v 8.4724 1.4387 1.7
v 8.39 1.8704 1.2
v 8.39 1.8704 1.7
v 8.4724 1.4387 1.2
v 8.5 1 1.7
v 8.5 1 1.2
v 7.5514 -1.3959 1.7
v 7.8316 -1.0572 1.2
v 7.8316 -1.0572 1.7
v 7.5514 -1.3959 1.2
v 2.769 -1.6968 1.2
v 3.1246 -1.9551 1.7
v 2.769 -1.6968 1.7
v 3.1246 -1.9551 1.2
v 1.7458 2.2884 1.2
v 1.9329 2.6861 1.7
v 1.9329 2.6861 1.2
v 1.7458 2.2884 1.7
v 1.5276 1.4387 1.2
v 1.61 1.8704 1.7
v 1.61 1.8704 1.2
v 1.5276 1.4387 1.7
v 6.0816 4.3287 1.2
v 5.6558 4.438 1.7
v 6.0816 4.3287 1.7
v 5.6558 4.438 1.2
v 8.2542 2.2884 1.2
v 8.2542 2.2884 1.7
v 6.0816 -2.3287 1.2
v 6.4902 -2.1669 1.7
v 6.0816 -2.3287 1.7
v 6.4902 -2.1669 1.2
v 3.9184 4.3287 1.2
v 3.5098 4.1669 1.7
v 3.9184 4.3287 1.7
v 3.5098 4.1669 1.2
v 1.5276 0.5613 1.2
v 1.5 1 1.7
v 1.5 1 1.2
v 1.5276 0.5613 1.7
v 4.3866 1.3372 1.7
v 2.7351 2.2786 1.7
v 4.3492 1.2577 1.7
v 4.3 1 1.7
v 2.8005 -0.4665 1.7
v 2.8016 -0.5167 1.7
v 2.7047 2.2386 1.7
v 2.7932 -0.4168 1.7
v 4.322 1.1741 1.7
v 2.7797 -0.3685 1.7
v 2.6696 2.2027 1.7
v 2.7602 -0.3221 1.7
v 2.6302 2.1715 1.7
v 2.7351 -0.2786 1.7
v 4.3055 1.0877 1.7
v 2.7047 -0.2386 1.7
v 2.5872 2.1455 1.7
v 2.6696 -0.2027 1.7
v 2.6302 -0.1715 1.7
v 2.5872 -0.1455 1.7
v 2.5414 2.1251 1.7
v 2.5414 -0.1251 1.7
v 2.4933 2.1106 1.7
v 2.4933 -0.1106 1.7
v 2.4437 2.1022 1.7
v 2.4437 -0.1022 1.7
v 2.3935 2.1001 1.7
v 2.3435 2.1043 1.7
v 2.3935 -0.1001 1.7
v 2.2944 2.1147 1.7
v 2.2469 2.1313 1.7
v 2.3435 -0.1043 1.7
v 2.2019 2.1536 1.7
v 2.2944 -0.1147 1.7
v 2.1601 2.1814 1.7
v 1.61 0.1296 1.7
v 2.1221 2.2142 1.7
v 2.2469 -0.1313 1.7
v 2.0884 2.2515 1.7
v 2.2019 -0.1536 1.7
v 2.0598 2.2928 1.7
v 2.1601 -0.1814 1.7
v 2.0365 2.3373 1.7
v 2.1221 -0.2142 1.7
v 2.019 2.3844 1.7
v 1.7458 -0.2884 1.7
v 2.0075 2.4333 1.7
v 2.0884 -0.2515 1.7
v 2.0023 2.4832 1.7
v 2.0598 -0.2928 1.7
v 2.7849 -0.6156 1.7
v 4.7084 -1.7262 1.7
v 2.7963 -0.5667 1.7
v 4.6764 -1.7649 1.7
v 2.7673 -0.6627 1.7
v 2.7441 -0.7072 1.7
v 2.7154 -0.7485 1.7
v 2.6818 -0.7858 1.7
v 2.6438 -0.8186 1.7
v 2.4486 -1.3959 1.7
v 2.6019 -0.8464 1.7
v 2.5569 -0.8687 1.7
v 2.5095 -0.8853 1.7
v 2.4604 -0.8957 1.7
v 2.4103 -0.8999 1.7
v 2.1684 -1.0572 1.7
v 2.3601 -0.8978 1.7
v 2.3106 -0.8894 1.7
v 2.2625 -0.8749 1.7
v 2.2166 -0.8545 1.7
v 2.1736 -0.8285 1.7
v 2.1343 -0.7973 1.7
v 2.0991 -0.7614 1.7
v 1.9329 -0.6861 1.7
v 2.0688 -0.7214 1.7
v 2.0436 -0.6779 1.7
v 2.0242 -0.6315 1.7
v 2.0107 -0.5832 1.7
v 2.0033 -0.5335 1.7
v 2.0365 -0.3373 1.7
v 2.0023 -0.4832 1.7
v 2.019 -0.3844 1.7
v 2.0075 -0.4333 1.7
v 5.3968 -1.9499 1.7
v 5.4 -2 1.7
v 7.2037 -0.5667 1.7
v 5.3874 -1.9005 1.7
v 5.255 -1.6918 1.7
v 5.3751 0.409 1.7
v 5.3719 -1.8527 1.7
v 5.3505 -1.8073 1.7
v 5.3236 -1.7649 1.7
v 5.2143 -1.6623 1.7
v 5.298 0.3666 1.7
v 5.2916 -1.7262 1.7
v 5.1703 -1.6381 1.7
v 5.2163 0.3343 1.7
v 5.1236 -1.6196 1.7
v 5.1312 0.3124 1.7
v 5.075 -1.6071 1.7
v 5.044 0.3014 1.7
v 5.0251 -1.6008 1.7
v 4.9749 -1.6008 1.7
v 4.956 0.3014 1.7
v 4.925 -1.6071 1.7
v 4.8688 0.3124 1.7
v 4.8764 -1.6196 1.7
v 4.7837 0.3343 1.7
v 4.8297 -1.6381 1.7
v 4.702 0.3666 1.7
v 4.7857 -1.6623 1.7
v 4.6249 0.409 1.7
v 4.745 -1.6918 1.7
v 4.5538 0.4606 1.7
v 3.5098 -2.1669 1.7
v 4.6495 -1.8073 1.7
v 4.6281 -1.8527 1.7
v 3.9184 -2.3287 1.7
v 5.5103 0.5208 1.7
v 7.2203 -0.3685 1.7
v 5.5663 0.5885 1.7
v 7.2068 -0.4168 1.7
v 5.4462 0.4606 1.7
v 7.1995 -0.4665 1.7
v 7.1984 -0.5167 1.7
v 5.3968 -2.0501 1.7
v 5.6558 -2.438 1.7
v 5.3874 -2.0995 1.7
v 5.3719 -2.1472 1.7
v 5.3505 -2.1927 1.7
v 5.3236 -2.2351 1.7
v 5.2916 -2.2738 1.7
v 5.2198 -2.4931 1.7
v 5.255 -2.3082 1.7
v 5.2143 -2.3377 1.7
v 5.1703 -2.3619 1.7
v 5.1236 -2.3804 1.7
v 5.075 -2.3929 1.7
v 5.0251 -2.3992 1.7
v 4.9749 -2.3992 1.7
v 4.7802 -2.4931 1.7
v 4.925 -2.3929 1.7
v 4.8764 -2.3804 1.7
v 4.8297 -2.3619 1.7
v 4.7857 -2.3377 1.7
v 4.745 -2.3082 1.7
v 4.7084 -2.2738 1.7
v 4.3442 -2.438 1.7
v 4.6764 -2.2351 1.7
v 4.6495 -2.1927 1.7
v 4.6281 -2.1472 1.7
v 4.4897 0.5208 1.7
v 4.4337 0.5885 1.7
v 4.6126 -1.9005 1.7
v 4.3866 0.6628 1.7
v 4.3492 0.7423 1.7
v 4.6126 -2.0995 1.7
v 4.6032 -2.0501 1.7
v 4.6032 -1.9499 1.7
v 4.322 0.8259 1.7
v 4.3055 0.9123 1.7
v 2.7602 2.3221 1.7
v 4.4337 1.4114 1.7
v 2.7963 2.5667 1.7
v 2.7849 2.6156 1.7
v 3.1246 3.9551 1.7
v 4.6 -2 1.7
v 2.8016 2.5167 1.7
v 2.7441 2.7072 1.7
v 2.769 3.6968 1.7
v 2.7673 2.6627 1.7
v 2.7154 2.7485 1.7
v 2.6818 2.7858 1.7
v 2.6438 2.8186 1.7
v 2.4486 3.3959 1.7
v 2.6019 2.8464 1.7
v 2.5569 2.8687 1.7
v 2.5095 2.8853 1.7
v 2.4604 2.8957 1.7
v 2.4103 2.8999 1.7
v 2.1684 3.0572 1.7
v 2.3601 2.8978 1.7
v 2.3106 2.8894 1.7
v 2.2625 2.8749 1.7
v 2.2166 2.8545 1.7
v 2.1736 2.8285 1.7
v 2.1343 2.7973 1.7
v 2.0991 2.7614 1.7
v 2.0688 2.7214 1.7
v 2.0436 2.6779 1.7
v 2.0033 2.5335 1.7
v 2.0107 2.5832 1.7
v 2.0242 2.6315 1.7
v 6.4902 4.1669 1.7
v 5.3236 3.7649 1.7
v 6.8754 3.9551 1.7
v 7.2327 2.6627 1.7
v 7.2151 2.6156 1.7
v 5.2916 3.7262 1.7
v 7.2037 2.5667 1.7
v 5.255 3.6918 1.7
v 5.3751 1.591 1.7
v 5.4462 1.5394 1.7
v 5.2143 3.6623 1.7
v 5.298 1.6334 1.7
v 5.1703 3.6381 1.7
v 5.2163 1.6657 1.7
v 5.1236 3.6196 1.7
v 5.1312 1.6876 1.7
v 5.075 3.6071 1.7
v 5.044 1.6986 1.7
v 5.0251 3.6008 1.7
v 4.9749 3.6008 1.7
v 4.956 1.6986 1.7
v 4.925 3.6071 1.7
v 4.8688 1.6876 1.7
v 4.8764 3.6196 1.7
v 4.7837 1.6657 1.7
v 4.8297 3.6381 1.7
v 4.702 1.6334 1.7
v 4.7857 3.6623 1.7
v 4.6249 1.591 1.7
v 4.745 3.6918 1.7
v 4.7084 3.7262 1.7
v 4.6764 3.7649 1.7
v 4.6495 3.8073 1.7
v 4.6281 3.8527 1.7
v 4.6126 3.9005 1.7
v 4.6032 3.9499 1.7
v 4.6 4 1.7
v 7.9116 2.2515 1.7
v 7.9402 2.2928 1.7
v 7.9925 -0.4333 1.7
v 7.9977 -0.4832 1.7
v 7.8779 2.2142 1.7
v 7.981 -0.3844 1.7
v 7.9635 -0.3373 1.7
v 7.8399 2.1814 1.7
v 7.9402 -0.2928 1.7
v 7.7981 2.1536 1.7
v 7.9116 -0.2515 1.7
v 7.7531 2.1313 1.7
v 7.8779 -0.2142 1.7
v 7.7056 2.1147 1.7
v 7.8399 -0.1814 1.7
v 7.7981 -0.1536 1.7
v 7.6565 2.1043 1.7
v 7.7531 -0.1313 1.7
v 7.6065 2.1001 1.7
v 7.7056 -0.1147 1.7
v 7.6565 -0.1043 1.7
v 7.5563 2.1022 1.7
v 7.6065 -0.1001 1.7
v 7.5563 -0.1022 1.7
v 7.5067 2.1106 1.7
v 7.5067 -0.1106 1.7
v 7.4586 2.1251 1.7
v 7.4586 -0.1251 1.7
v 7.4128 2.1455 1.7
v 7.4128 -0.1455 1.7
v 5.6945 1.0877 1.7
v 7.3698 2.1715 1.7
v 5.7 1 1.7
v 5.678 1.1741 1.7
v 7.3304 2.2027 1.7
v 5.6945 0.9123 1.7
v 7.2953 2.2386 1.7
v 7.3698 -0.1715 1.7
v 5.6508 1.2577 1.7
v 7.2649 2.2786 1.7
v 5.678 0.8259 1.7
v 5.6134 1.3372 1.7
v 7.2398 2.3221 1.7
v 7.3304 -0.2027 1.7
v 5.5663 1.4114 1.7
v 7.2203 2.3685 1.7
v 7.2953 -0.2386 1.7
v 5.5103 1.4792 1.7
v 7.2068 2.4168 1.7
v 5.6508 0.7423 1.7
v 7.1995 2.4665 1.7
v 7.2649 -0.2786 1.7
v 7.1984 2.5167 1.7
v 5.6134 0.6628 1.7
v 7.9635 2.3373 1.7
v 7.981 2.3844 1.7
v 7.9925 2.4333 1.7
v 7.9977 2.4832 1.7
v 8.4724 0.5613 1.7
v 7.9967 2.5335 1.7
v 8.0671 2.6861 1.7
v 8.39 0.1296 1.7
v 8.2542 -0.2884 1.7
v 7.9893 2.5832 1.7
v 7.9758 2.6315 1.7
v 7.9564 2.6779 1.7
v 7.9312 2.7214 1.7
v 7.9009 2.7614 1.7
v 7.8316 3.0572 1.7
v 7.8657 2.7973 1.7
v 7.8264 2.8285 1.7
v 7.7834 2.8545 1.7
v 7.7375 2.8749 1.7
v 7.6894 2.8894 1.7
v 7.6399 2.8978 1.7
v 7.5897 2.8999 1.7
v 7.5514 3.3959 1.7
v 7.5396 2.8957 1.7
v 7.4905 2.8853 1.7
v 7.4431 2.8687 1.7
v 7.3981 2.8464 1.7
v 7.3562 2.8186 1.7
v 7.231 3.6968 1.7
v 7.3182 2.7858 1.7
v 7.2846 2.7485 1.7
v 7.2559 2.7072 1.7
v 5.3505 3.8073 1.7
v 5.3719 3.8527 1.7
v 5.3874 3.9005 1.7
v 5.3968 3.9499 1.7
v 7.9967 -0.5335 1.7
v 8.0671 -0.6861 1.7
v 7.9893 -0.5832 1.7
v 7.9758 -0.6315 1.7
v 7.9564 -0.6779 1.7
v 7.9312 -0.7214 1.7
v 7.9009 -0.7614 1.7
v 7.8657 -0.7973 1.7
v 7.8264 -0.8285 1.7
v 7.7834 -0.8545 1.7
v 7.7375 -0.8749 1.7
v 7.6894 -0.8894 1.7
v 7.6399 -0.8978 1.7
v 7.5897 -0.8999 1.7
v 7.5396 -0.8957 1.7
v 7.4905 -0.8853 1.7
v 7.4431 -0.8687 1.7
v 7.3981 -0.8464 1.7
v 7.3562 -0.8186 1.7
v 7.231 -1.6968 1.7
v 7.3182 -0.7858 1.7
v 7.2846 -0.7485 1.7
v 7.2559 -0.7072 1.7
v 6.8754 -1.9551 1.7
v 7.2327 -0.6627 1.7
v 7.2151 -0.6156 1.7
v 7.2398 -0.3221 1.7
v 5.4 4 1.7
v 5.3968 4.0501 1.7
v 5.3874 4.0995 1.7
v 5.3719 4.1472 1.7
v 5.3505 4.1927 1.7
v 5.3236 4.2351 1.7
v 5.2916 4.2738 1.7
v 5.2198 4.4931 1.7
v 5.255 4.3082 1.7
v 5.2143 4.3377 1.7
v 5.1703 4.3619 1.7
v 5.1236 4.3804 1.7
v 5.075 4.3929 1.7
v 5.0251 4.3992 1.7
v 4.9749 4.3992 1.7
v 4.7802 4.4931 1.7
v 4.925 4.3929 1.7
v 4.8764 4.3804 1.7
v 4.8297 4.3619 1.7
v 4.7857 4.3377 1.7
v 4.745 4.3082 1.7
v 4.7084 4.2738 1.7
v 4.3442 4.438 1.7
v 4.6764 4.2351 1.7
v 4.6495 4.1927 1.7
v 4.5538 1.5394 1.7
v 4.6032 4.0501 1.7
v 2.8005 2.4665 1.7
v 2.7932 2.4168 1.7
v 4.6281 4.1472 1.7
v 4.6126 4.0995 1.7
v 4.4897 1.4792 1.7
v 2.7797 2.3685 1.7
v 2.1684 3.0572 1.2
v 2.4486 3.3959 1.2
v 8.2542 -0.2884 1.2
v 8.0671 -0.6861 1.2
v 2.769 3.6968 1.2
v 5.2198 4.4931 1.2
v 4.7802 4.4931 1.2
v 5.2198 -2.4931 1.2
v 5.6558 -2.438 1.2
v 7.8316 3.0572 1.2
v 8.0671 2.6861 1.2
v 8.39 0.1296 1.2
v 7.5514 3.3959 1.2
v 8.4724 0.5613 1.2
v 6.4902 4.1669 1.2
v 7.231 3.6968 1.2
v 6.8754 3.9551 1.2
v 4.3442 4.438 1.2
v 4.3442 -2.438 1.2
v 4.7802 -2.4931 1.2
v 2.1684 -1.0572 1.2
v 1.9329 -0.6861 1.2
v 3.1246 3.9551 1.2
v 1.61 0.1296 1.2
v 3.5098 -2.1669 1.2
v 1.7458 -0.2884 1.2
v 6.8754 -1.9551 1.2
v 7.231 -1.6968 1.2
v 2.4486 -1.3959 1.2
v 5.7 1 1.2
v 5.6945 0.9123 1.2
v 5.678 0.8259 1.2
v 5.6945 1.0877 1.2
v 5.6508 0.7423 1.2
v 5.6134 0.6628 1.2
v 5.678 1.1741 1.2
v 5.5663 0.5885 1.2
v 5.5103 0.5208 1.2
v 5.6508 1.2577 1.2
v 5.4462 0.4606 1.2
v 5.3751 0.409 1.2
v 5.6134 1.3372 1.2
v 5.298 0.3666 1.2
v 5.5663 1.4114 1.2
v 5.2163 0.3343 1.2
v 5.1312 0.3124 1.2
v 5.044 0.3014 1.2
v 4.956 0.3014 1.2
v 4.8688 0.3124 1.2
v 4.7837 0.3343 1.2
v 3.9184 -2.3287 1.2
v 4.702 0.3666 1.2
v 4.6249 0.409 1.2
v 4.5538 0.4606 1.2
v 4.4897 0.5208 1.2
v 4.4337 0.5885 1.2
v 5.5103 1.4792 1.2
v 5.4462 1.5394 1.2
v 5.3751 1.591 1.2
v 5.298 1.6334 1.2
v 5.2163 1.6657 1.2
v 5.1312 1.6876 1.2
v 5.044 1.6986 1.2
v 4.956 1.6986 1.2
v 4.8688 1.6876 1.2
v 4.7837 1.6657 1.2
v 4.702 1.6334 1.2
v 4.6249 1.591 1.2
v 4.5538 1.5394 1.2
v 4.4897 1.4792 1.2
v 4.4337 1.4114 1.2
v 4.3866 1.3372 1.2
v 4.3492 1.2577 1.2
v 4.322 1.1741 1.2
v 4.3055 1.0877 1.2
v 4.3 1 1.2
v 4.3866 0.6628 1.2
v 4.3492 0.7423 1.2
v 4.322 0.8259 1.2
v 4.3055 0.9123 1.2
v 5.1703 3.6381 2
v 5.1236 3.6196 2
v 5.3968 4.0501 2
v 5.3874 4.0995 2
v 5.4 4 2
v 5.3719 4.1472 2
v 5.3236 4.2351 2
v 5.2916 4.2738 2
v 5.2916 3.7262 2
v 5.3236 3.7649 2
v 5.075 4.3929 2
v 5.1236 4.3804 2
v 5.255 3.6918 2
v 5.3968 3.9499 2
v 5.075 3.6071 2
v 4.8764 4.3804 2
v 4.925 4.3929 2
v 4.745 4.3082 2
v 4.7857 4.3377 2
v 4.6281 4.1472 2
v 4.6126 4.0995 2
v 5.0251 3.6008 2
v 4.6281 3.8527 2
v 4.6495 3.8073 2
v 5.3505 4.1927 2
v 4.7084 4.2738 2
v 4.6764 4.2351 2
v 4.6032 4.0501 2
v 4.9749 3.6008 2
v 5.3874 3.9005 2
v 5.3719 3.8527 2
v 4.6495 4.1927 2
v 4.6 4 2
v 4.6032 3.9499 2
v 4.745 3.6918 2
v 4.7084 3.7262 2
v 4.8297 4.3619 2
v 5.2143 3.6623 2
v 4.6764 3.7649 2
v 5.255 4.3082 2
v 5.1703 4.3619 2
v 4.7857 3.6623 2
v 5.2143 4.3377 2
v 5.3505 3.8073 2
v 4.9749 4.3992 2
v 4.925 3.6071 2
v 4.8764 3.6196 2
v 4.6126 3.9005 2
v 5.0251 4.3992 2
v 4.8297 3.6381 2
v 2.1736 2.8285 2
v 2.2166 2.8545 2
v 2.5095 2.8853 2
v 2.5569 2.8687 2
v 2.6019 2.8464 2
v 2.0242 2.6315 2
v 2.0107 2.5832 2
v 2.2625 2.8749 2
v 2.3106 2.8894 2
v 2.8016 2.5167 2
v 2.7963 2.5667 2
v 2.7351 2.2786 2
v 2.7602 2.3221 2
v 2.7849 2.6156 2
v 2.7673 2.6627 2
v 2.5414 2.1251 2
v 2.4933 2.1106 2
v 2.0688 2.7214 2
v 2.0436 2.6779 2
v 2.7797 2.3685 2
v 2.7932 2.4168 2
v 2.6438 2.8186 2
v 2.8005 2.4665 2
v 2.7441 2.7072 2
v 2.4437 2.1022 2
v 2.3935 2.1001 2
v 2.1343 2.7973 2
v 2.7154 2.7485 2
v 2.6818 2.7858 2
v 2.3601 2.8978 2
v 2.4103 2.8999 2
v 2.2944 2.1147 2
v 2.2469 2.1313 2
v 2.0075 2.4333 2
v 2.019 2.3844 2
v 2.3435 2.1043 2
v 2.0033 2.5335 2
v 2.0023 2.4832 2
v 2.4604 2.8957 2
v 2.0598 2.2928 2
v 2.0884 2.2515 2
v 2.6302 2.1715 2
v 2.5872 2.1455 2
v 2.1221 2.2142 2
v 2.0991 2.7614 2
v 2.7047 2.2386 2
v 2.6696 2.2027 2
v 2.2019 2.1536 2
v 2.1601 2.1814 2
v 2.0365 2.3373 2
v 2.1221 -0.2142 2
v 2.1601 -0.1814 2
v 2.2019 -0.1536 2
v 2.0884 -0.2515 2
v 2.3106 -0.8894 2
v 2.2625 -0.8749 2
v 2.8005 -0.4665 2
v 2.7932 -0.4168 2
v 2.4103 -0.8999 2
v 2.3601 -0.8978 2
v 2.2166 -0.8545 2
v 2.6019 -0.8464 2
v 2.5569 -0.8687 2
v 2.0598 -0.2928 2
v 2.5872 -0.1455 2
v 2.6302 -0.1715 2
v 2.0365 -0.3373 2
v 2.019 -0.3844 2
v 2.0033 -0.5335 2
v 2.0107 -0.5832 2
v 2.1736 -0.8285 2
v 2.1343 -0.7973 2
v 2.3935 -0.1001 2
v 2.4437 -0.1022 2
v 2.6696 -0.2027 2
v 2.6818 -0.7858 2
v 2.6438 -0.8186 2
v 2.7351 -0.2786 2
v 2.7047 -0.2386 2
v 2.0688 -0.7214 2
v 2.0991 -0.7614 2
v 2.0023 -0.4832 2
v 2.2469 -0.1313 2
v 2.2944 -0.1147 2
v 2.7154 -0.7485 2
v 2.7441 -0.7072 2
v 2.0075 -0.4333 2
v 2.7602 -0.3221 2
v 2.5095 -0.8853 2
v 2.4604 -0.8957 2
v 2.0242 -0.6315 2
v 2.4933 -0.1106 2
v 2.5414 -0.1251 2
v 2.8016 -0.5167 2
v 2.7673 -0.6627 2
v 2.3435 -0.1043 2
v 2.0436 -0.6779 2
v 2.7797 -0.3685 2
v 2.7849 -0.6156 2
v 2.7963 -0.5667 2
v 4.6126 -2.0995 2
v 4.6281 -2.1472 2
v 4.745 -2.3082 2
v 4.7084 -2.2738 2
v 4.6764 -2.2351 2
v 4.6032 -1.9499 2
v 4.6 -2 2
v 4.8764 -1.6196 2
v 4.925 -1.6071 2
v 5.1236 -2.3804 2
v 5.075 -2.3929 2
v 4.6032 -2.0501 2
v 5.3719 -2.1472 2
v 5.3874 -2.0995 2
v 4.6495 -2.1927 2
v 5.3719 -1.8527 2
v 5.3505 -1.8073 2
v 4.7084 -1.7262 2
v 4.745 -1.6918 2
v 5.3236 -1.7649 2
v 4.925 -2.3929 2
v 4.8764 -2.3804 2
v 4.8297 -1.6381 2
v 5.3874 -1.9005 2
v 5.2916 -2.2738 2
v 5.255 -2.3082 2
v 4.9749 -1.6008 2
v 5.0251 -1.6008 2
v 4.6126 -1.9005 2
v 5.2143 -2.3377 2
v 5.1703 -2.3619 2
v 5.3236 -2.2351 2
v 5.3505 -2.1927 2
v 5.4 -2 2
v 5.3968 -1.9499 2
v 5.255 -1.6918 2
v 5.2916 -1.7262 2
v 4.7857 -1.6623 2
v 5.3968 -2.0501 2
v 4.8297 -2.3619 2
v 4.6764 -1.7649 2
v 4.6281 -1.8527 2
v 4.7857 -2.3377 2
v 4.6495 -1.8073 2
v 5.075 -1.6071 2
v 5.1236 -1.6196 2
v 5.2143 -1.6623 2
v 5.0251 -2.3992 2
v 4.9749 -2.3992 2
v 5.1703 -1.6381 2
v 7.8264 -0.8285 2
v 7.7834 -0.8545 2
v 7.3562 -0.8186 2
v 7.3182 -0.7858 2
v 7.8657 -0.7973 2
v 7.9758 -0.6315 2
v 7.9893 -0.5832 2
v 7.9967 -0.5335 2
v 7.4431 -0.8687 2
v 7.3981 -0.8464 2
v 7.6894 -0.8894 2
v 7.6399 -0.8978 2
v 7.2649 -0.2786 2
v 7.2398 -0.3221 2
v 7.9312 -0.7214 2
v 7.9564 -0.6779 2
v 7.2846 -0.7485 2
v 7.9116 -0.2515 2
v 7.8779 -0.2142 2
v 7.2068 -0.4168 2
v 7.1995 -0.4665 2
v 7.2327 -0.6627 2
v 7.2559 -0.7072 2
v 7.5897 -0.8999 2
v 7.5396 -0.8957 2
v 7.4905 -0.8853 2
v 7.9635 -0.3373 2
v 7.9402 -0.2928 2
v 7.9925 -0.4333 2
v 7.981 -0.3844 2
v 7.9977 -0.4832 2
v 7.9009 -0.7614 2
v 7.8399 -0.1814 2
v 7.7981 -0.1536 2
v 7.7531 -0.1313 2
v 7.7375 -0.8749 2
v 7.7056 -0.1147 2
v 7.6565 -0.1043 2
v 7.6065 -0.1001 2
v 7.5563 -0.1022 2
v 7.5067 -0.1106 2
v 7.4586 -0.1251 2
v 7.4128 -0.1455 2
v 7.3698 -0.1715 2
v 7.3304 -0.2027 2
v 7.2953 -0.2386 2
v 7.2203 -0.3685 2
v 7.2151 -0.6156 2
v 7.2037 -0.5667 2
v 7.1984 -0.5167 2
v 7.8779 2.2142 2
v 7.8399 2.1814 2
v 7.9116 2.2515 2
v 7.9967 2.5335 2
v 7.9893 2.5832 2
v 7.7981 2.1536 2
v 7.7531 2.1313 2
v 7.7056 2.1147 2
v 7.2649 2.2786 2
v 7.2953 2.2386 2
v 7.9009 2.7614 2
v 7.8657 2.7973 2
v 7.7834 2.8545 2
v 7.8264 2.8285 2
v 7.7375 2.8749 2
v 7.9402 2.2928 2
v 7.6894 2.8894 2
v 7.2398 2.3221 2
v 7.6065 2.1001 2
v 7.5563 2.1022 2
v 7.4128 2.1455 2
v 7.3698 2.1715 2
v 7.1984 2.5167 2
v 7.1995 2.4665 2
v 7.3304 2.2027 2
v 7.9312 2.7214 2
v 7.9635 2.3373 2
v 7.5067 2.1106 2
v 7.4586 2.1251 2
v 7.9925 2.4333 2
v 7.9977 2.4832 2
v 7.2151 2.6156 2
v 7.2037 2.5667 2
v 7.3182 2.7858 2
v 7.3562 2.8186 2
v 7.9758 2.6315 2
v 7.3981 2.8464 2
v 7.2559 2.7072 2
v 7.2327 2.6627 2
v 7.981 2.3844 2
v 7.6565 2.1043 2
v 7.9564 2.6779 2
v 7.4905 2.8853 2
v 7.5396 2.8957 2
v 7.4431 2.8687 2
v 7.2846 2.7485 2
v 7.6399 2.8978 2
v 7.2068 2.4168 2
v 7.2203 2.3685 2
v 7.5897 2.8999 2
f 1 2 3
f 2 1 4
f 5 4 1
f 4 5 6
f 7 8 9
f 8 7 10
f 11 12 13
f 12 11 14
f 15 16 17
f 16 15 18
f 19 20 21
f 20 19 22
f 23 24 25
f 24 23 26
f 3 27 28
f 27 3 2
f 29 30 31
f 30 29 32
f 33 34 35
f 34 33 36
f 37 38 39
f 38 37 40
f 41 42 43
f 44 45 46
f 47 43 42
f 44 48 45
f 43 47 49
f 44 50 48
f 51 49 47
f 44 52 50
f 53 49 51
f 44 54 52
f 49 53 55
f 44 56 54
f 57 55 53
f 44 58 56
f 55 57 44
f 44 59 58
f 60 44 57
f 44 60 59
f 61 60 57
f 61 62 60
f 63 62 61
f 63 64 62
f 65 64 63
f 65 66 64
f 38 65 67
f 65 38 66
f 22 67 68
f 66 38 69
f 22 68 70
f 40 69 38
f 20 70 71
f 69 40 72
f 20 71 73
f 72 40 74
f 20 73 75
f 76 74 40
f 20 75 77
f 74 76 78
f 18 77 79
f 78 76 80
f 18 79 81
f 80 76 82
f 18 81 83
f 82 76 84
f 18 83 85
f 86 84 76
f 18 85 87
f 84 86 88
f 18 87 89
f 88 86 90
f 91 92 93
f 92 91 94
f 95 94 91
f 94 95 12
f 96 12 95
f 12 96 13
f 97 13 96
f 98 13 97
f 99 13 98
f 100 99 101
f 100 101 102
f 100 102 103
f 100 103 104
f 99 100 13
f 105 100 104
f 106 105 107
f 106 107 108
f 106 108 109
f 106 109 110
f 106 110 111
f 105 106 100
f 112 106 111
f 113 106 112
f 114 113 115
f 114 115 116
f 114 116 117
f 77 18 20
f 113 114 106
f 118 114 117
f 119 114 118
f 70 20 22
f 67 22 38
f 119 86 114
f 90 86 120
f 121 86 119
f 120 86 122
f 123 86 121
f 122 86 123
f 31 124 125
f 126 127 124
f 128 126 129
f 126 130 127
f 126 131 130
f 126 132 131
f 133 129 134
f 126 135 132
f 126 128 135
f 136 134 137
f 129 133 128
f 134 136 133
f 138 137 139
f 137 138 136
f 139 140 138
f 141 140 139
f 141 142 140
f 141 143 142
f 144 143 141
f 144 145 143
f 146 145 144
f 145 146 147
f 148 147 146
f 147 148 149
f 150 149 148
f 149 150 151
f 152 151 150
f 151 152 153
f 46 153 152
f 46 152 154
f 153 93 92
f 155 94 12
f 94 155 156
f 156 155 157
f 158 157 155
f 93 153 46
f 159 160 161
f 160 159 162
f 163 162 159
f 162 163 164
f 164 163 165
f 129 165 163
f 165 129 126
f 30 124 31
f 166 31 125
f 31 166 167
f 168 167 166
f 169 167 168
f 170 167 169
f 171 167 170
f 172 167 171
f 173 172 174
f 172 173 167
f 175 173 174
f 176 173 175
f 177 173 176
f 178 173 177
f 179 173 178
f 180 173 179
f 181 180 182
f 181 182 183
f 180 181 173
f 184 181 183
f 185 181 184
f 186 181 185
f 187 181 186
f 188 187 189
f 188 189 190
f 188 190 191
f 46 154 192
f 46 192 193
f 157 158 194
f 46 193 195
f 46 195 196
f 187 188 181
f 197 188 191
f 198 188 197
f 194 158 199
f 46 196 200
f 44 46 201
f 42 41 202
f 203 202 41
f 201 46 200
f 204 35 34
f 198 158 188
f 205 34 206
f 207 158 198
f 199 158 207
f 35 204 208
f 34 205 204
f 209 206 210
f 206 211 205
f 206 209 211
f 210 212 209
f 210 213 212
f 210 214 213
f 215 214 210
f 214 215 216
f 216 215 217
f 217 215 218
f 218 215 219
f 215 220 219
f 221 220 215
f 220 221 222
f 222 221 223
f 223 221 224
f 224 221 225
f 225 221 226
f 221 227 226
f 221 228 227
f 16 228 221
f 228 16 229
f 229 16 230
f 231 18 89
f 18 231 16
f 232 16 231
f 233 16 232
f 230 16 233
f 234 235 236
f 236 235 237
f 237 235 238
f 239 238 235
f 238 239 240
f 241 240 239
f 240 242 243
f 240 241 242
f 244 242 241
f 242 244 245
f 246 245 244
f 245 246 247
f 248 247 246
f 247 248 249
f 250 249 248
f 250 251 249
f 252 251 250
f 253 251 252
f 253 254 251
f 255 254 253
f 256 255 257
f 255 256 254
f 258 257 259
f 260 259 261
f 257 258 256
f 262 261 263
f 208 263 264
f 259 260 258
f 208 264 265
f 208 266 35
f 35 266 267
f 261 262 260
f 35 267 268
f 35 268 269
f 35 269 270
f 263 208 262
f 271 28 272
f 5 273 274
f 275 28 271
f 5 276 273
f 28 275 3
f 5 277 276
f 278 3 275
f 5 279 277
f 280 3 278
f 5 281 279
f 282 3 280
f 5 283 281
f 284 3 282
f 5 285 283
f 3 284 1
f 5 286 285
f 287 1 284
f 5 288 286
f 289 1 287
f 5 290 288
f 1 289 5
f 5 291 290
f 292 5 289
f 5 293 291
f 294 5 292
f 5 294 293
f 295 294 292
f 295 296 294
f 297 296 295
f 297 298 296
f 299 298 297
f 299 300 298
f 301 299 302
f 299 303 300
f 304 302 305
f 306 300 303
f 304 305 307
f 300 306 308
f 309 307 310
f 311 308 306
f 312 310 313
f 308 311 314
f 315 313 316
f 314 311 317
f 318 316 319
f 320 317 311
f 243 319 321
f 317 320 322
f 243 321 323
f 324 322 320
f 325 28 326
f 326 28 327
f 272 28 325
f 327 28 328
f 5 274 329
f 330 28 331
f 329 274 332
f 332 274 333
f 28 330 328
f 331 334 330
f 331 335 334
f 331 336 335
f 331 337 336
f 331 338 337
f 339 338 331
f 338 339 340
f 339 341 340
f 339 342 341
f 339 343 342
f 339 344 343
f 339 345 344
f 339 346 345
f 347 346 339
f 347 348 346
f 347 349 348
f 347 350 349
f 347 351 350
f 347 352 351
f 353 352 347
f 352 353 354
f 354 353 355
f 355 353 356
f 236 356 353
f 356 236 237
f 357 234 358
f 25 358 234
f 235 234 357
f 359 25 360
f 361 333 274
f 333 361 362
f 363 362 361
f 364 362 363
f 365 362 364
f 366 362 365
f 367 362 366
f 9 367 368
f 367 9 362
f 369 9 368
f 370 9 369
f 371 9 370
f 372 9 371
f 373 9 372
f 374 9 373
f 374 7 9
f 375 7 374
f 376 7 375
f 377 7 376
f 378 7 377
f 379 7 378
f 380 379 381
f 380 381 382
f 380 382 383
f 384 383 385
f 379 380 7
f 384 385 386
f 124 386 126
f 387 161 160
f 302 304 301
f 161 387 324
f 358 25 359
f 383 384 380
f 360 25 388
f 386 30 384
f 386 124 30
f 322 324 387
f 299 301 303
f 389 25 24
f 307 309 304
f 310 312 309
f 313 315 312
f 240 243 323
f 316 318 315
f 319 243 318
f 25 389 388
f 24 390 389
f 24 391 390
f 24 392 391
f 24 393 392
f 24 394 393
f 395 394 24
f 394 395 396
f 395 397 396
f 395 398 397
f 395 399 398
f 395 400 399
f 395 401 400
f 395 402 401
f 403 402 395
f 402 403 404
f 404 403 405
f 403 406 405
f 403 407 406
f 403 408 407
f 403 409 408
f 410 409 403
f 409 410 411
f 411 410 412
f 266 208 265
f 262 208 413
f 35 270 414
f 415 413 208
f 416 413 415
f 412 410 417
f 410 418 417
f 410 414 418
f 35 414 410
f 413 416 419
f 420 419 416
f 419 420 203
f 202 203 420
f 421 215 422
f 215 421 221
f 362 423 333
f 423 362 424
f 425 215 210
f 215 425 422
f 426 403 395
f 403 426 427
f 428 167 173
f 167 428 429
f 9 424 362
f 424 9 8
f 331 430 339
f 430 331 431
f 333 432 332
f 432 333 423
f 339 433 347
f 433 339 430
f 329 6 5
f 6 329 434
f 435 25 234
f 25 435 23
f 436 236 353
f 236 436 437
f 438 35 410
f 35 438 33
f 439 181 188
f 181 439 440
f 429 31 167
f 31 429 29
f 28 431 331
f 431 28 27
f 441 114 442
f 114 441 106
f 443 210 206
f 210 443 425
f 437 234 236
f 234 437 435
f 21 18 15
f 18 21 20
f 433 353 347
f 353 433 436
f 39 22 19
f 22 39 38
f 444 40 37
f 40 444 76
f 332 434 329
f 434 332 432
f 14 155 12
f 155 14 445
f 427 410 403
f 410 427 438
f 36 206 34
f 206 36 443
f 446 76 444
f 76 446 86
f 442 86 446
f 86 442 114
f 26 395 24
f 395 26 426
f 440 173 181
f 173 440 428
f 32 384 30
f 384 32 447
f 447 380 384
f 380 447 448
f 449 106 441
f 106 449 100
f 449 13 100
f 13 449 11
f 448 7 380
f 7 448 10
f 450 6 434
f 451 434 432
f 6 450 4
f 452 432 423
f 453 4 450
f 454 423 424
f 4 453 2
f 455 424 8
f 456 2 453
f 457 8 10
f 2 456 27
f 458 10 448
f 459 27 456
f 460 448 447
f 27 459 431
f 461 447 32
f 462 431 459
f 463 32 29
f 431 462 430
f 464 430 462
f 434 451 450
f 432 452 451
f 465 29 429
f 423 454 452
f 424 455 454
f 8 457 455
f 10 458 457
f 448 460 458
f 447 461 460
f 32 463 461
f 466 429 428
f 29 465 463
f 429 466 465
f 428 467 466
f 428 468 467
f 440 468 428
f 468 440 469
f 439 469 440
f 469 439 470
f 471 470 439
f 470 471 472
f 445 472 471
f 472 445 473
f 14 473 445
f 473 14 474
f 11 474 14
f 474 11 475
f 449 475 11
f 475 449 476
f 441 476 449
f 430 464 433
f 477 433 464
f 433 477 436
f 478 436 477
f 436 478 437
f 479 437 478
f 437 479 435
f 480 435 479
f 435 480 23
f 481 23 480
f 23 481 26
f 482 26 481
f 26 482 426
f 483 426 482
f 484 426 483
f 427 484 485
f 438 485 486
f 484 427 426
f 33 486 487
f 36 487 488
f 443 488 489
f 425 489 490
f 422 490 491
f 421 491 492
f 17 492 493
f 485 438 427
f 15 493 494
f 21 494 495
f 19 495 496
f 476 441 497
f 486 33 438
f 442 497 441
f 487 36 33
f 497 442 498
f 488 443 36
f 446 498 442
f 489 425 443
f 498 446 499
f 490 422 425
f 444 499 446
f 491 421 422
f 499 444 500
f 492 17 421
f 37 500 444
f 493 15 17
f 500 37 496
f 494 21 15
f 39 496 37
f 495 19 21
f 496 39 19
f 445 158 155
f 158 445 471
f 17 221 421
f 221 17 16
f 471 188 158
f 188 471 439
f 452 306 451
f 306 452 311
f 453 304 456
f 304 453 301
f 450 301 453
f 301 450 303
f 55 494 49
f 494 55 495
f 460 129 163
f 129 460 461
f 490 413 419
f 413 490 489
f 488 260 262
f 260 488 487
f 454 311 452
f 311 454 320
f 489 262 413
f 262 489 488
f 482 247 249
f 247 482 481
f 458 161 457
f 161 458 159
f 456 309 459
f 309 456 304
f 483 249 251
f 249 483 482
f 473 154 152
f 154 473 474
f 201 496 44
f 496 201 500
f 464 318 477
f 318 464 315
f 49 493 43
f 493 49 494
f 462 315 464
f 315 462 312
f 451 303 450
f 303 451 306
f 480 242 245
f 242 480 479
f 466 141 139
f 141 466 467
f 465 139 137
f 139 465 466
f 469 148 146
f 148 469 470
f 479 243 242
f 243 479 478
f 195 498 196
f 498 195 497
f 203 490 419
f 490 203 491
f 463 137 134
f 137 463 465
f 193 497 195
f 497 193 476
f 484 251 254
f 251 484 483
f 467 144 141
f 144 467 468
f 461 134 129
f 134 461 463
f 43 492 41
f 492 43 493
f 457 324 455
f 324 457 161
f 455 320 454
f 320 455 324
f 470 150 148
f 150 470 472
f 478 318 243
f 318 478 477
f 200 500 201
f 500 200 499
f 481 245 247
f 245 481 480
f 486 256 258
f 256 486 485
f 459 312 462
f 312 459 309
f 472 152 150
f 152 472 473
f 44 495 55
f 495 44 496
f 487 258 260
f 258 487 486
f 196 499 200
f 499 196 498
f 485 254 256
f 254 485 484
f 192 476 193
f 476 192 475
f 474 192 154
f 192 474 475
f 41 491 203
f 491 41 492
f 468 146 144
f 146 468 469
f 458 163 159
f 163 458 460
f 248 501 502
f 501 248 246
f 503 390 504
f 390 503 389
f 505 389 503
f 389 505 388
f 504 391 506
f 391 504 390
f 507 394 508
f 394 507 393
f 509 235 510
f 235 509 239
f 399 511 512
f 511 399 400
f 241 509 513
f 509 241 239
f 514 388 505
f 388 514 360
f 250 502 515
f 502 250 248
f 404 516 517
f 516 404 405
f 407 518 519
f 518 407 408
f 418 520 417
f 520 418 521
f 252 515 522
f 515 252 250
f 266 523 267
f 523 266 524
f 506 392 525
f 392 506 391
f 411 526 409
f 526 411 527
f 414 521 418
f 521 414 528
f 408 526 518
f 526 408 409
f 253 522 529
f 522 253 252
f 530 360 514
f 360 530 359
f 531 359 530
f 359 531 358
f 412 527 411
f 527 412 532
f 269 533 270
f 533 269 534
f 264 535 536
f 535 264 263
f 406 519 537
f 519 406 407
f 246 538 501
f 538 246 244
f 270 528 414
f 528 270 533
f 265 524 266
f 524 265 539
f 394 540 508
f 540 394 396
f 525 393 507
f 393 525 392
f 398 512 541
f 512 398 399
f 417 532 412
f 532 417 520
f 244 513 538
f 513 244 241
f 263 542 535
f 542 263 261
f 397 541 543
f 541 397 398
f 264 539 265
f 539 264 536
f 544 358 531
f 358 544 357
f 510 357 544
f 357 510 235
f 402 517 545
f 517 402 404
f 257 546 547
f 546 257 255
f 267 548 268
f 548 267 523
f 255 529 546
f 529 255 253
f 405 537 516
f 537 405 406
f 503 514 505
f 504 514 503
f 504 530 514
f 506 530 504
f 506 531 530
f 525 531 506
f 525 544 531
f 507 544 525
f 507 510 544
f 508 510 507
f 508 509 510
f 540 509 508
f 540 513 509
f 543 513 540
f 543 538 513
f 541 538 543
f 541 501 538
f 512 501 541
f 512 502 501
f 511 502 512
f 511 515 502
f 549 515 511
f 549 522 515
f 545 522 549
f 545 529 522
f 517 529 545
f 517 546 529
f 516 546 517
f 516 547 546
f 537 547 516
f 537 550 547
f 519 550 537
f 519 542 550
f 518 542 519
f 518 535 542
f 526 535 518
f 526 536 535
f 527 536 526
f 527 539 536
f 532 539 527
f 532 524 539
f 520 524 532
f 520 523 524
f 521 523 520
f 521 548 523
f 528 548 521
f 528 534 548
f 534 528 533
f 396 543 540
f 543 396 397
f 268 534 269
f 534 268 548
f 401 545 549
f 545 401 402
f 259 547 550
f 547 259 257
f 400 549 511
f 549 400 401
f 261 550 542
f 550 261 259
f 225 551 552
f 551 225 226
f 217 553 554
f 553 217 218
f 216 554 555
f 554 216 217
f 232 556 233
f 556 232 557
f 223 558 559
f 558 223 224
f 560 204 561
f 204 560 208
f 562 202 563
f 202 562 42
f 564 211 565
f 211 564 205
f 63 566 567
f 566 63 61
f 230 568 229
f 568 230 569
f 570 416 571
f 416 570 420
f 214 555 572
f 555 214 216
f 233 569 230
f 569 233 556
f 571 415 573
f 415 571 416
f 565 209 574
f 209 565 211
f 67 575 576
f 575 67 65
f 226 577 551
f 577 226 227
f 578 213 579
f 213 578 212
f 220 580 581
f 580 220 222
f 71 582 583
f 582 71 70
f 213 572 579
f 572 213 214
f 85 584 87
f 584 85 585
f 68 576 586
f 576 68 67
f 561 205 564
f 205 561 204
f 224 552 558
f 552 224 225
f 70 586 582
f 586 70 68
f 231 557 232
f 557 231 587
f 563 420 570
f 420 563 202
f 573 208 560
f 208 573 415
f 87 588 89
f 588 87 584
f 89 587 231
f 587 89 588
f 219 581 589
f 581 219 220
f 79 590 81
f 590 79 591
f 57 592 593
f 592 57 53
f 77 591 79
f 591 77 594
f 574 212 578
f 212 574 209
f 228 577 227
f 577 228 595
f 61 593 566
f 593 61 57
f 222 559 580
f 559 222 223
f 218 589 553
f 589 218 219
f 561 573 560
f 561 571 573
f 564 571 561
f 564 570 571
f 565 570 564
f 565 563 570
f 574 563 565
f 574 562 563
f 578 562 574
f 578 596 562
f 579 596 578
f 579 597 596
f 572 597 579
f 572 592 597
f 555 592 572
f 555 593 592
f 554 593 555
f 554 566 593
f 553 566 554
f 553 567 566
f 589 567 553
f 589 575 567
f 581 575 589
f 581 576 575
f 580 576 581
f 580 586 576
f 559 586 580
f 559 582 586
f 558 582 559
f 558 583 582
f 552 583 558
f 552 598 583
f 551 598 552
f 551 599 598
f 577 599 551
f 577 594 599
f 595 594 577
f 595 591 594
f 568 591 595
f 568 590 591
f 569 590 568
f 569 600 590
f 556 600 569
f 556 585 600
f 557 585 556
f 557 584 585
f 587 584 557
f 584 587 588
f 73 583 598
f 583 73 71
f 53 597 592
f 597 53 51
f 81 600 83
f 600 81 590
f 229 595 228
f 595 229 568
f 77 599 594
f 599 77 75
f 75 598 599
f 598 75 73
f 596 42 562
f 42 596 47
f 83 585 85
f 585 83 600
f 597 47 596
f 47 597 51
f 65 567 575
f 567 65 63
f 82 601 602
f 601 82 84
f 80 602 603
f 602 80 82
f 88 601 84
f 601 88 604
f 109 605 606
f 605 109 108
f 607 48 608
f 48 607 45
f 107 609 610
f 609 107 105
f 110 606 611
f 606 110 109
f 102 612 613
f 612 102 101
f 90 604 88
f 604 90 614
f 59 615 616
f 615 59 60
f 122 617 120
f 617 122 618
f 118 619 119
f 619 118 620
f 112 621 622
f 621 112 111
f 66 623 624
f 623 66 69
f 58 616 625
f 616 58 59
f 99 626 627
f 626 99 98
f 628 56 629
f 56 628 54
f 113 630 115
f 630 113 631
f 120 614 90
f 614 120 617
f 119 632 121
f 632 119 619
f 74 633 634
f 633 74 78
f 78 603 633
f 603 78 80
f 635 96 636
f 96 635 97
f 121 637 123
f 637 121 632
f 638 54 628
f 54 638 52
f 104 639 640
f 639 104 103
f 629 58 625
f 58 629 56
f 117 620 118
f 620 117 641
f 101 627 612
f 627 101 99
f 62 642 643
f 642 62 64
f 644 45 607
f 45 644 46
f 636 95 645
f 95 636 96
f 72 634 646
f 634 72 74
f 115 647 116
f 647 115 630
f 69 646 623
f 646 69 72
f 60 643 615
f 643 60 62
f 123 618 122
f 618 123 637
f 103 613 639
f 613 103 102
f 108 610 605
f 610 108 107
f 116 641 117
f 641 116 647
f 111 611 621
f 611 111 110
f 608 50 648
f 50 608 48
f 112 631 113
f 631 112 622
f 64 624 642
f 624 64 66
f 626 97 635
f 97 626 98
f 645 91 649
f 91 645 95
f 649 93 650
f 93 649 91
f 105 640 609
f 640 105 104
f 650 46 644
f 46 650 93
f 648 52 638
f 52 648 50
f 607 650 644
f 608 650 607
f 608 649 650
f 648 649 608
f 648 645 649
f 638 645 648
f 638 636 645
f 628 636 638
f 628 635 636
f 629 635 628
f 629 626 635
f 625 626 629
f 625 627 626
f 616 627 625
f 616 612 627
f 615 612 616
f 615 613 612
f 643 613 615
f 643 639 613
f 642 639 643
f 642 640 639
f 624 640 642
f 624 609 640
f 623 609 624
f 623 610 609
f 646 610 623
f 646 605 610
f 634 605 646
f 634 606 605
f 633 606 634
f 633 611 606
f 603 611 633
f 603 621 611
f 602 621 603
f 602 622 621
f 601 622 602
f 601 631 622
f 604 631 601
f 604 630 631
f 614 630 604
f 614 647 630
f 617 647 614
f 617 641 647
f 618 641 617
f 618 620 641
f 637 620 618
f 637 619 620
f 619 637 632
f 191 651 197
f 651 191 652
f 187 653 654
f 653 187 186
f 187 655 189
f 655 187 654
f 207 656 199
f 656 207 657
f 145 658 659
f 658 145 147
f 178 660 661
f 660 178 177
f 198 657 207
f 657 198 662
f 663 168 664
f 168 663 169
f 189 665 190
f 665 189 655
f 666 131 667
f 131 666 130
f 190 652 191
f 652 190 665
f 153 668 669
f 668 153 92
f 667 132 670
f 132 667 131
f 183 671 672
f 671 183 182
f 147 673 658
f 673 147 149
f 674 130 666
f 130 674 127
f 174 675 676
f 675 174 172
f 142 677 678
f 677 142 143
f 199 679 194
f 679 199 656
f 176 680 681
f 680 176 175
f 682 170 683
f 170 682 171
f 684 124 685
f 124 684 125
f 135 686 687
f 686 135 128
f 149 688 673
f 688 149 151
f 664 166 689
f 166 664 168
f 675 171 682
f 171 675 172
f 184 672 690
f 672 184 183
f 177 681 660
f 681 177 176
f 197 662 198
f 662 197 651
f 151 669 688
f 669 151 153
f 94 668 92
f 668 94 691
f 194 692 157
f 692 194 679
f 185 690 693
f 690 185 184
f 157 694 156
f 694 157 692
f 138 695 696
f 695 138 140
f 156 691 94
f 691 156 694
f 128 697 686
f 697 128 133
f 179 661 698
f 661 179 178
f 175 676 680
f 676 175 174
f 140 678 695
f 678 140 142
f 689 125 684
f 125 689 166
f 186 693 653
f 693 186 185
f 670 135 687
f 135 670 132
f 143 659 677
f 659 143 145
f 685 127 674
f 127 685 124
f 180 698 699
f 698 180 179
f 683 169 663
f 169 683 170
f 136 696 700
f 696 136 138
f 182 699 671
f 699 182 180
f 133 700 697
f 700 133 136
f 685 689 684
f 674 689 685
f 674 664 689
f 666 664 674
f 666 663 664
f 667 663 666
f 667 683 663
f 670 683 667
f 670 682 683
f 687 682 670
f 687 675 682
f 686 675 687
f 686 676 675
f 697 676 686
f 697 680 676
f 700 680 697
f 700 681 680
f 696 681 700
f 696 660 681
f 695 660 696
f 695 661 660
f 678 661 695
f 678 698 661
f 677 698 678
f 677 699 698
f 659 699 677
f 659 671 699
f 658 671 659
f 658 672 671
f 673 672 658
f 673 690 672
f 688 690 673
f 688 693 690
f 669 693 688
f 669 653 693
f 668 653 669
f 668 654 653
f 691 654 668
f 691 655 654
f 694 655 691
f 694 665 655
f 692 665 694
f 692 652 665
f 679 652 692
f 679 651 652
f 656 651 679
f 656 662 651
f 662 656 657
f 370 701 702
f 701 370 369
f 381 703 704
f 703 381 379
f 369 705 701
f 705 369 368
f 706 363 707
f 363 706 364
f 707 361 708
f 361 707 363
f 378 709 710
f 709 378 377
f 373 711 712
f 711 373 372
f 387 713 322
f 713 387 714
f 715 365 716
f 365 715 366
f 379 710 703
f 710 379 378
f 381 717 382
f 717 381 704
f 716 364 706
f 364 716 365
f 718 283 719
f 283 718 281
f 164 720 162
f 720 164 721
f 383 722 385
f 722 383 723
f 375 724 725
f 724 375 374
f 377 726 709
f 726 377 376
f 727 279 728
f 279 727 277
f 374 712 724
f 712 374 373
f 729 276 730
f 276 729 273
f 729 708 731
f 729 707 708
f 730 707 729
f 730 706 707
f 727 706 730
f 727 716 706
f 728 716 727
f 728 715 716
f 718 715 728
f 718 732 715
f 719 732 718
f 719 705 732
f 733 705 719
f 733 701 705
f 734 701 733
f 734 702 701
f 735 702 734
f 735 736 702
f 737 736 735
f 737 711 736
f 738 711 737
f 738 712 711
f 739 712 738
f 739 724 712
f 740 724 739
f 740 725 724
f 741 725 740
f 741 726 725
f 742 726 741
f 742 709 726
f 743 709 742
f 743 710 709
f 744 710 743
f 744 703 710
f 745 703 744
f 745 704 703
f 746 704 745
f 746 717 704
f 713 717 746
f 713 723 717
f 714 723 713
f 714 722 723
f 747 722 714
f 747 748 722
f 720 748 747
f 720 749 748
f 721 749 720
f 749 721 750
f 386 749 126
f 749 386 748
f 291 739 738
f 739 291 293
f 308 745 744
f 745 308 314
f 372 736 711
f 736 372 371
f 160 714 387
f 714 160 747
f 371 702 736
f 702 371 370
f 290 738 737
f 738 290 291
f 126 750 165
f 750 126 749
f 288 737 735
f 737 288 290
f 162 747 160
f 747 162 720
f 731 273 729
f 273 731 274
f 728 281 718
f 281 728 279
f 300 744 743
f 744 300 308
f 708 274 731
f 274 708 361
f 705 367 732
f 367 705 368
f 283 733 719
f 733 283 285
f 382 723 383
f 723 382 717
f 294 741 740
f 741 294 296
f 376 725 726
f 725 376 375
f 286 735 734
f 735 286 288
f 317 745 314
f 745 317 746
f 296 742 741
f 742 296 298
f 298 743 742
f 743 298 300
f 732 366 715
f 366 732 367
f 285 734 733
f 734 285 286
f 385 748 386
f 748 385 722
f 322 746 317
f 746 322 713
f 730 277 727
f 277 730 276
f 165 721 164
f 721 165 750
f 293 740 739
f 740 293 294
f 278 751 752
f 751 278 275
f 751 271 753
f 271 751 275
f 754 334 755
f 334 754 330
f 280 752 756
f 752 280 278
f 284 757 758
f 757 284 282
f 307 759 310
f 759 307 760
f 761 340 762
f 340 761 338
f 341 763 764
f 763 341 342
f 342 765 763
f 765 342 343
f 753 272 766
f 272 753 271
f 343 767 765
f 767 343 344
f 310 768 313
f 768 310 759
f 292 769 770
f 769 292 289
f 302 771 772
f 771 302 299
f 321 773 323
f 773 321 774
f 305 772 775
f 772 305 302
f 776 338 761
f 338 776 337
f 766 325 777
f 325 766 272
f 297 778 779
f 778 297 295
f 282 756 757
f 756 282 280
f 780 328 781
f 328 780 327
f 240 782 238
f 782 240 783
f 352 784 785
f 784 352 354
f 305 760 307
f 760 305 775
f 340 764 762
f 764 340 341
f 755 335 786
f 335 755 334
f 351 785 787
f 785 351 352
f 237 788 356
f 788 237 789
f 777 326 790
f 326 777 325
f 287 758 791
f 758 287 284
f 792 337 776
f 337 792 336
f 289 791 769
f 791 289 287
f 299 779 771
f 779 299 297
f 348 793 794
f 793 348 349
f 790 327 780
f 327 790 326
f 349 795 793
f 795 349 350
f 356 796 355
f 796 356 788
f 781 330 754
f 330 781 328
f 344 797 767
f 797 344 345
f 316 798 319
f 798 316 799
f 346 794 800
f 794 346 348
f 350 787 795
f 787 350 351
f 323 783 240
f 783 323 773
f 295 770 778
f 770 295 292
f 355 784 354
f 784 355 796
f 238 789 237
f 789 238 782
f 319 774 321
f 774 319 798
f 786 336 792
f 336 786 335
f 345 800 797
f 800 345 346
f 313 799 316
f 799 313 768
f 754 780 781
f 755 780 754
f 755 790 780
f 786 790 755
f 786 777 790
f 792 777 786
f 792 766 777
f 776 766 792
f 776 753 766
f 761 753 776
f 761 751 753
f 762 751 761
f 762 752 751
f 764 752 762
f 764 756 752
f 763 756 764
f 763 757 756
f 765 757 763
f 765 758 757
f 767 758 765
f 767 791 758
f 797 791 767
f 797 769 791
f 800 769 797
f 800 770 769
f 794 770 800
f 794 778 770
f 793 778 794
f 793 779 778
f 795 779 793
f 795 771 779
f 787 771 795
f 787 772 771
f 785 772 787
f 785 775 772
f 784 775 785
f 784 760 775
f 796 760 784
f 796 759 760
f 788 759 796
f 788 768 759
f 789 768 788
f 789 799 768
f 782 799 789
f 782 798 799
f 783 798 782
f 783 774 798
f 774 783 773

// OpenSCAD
module inner(){
	translate([1,1,0])
		cube([6,7,1]);
	cube([8,6,1]);
}

module box(){
	difference(){
		cube([10,4,3]);

		translate([1,-1,1])
			inner();
	}
	
	translate([5,1,0])
		cylinder(r=0.5, h=3, $fn=50);
}

module roller(){
	difference(){
		color("red")
			translate([5,1,1.2])
			cylinder(r=3.5, h=0.5, $fn=50);

		translate([5,1,1])
			cylinder(r=0.7, h=1, $fn=50);
	}
}

module vex(){
	translate([5, 1, 1.5])
		for( i = [0:5] ){

			rotate(i*360/6, [0,0,1])
			translate([0, 3, 0])
			cylinder(r=0.4, h=0.5, $fn=50);
	}
}

% box();
roller();
vex();
